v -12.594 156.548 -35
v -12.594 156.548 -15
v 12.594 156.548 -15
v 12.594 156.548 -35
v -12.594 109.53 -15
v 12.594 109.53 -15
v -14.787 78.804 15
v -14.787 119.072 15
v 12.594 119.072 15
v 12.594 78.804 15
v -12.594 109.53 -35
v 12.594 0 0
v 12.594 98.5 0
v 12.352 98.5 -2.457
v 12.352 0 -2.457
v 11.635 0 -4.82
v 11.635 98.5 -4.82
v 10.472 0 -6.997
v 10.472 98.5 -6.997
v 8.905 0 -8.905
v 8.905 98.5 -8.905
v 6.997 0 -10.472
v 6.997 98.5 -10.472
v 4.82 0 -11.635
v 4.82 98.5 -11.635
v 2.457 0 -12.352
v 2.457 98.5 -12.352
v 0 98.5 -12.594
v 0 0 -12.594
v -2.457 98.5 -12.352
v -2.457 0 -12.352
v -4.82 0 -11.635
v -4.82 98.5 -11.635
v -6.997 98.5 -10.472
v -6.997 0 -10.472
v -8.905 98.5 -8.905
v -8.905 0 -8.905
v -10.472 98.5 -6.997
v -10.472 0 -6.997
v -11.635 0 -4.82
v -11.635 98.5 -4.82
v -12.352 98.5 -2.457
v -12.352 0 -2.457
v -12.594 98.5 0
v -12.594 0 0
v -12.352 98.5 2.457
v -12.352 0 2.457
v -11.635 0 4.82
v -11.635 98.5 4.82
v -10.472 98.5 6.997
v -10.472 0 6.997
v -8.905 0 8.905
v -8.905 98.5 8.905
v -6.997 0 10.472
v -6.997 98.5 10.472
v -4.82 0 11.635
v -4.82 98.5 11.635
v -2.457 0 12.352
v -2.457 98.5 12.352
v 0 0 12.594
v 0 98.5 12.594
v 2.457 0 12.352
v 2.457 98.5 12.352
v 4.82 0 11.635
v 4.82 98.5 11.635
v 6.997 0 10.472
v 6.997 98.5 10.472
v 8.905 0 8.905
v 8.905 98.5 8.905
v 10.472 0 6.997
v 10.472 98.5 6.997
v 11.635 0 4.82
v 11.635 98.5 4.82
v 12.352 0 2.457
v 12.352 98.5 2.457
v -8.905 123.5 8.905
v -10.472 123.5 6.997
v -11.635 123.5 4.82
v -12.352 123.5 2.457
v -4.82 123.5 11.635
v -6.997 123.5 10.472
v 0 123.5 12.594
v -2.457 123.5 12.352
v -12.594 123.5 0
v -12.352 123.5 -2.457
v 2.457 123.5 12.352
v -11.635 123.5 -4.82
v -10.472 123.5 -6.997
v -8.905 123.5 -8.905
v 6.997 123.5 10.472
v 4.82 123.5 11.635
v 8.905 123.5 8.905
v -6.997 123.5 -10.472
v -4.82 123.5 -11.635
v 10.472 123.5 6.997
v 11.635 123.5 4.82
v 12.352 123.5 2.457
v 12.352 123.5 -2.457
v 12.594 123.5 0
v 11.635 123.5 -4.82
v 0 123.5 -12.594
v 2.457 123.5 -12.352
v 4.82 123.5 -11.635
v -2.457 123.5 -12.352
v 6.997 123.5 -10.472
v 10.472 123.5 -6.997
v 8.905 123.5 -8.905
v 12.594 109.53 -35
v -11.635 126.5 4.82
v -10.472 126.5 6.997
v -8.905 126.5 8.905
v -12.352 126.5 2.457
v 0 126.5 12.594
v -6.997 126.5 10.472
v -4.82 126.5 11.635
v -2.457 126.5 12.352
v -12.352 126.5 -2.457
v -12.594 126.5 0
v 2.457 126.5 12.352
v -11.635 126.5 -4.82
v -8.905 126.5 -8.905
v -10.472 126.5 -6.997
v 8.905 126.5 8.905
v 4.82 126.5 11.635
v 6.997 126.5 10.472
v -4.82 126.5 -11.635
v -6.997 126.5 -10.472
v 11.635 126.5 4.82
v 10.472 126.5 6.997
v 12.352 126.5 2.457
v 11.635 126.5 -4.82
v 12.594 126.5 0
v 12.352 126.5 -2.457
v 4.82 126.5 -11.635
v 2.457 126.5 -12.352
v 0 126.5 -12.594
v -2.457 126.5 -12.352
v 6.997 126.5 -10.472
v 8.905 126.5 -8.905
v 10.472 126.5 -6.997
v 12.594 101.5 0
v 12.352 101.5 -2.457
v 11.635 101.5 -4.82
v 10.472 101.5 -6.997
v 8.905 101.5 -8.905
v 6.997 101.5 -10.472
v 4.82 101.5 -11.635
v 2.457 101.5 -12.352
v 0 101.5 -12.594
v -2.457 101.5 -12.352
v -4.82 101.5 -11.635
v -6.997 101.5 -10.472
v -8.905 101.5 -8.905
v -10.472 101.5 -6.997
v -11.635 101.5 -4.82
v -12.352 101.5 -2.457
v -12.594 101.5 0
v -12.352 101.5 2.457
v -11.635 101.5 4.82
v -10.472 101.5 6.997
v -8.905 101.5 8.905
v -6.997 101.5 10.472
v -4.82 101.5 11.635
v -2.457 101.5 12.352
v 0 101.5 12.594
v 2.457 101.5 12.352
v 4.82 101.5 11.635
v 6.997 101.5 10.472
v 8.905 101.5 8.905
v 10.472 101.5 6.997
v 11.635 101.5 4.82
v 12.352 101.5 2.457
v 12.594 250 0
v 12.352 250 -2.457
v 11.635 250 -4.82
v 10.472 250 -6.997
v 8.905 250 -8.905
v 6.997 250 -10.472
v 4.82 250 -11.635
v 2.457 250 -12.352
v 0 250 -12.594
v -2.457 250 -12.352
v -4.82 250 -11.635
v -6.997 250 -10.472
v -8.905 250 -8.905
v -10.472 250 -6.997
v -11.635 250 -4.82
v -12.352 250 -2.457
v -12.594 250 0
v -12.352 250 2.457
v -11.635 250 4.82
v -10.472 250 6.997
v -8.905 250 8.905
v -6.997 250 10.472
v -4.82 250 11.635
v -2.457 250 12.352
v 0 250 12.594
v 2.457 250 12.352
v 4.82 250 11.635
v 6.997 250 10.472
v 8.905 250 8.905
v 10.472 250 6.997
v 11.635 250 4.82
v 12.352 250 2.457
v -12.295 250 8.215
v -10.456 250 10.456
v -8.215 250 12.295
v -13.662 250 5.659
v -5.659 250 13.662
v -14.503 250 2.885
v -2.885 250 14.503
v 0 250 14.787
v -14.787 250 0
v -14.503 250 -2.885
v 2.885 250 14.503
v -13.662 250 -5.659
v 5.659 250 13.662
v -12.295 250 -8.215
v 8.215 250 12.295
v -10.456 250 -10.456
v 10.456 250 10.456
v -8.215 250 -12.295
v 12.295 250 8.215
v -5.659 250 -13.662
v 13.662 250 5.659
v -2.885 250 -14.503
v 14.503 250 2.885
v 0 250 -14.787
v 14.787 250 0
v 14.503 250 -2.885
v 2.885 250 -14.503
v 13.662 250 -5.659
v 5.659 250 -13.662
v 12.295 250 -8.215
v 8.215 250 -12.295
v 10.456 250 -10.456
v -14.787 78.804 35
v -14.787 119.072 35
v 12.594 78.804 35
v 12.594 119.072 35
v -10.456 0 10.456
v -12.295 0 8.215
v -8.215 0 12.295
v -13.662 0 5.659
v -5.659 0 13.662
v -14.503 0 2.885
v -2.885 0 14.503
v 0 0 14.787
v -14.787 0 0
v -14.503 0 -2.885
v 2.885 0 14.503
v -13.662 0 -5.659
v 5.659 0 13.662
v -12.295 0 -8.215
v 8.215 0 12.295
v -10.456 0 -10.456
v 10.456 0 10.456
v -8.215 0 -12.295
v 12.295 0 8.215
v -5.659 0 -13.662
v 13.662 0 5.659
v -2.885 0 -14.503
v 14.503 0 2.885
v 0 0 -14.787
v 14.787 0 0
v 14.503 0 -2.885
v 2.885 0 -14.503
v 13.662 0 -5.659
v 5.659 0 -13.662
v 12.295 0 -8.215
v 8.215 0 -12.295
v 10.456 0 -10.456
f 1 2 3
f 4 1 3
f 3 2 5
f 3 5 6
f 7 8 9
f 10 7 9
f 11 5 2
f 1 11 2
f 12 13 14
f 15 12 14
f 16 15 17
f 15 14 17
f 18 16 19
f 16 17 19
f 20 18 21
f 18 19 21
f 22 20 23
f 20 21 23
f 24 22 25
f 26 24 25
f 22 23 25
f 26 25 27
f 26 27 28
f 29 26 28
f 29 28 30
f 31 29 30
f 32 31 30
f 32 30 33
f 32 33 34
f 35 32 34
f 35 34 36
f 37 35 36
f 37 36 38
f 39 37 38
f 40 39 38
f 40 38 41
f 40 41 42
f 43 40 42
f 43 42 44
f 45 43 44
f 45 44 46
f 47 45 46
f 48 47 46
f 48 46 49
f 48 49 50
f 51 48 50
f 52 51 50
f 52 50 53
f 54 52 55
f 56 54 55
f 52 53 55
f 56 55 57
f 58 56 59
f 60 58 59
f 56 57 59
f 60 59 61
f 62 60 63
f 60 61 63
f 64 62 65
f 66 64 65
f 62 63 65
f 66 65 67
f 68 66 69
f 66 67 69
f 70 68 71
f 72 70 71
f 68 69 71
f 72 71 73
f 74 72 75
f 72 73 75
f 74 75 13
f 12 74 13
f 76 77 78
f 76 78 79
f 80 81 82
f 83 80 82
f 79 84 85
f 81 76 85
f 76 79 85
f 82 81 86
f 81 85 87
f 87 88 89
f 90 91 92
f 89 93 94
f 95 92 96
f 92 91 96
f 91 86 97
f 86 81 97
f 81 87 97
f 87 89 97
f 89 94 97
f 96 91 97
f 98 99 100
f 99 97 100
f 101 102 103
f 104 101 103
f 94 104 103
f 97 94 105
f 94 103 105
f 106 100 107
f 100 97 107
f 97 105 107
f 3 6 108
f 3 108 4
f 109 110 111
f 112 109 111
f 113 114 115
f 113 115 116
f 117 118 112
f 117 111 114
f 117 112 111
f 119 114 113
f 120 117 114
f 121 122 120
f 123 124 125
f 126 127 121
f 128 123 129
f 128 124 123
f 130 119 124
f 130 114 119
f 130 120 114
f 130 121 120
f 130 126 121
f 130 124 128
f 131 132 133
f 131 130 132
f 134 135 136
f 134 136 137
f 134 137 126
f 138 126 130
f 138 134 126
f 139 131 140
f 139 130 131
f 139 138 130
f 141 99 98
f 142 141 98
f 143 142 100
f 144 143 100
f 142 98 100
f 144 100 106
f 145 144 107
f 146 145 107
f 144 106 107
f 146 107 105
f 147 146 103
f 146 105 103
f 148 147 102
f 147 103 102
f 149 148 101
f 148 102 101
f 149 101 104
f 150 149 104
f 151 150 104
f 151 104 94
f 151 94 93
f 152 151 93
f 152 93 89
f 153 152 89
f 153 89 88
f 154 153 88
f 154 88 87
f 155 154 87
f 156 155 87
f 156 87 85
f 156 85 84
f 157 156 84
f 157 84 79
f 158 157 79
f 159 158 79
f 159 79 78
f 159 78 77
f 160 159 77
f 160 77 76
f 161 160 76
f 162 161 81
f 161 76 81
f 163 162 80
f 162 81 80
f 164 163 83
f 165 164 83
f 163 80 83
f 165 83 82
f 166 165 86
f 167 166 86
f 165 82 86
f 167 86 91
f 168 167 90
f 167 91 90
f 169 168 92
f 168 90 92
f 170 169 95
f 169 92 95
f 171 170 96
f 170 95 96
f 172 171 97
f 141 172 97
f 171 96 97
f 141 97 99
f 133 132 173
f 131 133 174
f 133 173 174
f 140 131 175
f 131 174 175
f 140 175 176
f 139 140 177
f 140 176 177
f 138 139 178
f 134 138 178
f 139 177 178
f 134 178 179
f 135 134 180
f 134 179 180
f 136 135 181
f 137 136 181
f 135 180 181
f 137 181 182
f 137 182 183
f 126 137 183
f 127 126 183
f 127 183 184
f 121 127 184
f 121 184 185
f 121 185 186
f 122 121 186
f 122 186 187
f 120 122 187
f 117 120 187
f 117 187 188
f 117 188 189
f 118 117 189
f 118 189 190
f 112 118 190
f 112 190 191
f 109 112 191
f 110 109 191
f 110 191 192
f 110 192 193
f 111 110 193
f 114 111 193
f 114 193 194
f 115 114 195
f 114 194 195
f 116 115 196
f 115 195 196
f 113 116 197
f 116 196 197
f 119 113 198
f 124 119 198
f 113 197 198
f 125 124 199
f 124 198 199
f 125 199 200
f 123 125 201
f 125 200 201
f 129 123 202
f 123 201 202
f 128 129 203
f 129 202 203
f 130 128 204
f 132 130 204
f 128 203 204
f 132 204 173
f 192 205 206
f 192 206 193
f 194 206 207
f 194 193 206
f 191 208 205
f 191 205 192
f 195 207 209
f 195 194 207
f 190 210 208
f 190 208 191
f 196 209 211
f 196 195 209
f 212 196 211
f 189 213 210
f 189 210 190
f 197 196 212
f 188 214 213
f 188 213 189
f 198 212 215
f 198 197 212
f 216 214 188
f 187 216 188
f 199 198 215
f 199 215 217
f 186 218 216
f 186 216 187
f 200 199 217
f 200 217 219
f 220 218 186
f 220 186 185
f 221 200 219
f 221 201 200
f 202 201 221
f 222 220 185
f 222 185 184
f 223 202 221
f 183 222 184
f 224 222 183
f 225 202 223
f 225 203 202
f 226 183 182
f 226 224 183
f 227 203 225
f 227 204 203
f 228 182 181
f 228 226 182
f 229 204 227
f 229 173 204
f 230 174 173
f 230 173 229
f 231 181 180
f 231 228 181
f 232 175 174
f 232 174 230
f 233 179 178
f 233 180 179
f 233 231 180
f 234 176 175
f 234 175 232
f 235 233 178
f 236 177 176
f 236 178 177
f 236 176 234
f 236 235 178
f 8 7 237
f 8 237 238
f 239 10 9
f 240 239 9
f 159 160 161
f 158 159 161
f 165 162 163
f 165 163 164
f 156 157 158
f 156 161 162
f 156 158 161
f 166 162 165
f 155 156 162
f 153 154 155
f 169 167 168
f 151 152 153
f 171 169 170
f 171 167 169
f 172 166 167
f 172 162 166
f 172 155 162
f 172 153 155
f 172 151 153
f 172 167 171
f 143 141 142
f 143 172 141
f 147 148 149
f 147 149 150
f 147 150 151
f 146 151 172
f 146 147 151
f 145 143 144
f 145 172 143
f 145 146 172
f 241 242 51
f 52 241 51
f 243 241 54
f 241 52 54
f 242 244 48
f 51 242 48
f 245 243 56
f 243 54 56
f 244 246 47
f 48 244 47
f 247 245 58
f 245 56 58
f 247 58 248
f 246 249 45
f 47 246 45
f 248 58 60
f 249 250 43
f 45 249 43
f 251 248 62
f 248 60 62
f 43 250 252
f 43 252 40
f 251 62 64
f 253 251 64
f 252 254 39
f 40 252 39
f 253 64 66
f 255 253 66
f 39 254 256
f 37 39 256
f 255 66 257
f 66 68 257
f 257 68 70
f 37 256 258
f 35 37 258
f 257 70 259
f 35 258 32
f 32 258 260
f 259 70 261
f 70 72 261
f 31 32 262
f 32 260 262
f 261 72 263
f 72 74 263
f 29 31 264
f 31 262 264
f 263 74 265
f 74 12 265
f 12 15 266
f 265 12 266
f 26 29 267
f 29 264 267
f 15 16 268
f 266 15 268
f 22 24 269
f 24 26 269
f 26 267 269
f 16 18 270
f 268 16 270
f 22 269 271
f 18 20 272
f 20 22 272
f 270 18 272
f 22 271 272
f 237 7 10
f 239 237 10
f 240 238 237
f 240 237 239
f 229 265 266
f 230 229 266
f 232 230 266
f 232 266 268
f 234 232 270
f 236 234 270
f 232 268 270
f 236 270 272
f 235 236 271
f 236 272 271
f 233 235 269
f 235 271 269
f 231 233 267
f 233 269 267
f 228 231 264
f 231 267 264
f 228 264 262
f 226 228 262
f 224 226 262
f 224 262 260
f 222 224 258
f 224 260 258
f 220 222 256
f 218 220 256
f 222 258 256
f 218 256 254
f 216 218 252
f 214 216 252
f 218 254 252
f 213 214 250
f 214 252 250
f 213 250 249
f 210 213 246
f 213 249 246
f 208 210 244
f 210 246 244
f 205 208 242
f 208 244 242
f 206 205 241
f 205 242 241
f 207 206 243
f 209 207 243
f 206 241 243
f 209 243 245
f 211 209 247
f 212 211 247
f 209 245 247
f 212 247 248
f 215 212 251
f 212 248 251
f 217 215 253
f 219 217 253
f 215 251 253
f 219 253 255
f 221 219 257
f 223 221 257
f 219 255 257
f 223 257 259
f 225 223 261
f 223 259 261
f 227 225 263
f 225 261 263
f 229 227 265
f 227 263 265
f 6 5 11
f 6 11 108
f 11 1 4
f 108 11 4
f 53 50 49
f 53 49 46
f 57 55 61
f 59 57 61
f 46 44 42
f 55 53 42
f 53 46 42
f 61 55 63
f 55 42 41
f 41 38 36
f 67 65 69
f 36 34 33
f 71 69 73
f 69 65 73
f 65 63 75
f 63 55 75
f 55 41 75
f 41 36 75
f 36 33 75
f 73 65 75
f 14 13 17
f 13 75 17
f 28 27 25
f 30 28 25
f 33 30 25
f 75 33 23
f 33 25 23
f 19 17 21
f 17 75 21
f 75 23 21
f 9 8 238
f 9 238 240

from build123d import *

# Parameters (mm, degrees)
SKETCH1_R           = 14.78728341
BOSS_EXTRUDE1_DEPTH = 250
SKETCH2_R           = 12.59408245
CUT_EXTRUDE1_DEPTH  = 250
SKETCH4_R           = 12.59408245
BOSS_EXTRUDE2_DEPTH = 1.5
SKETCH5_R           = 12.59408245
BOSS_EXTRUDE3_DEPTH = 1.5
SKETCH7_W           = 27.38136586
SKETCH7_H           = 40.26816594
BOSS_EXTRUDE4_DEPTH = 20
SKETCH8_W           = 25.1881649
SKETCH8_H           = 47.017714204
BOSS_EXTRUDE5_DEPTH = 20


with BuildPart() as part:
    # Sketch1 → Boss-Extrude1 (new body)
    with BuildSketch(Plane(origin=(0, 0, 0), x_dir=(1, 0, 0), z_dir=(0, 1, 0))):
        Circle(SKETCH1_R)
    extrude(amount=BOSS_EXTRUDE1_DEPTH)

    # Sketch2 → Cut-Extrude1 (cut)
    with BuildSketch(Plane(origin=(0, 250, 0), x_dir=(1, 0, 0), z_dir=(0, 1, 0))):
        Circle(SKETCH2_R)
    extrude(amount=-CUT_EXTRUDE1_DEPTH, mode=Mode.SUBTRACT)

    # Sketch4 → Boss-Extrude2 (add, symmetric)
    with BuildSketch(Plane(origin=(0, 125, 0), x_dir=(1, 0, 0), z_dir=(0, 1, 0))):
        Circle(SKETCH4_R)
    extrude(amount=BOSS_EXTRUDE2_DEPTH, both=True)

    # Sketch5 → Boss-Extrude3 (add, symmetric)
    with BuildSketch(Plane(origin=(0, 100, 0), x_dir=(1, 0, 0), z_dir=(0, 1, 0))):
        Circle(SKETCH5_R)
    extrude(amount=BOSS_EXTRUDE3_DEPTH, both=True)


with BuildPart() as body_2:
    # Sketch7 → Boss-Extrude4 (new body)
    with BuildSketch(Plane.XY.offset(15)):
        with Locations((-1.09660048, 98.938392556)):
            Rectangle(SKETCH7_W, SKETCH7_H)
    extrude(amount=BOSS_EXTRUDE4_DEPTH)


with BuildPart() as body_3:
    # Sketch8 → Boss-Extrude5 (new body)
    with BuildSketch(Plane.XY.offset(-15)):
        with Locations((0, 133.039230776)):
            Rectangle(SKETCH8_W, SKETCH8_H)
    extrude(amount=-BOSS_EXTRUDE5_DEPTH)


solid = Compound([part.part, body_2.part, body_3.part])
